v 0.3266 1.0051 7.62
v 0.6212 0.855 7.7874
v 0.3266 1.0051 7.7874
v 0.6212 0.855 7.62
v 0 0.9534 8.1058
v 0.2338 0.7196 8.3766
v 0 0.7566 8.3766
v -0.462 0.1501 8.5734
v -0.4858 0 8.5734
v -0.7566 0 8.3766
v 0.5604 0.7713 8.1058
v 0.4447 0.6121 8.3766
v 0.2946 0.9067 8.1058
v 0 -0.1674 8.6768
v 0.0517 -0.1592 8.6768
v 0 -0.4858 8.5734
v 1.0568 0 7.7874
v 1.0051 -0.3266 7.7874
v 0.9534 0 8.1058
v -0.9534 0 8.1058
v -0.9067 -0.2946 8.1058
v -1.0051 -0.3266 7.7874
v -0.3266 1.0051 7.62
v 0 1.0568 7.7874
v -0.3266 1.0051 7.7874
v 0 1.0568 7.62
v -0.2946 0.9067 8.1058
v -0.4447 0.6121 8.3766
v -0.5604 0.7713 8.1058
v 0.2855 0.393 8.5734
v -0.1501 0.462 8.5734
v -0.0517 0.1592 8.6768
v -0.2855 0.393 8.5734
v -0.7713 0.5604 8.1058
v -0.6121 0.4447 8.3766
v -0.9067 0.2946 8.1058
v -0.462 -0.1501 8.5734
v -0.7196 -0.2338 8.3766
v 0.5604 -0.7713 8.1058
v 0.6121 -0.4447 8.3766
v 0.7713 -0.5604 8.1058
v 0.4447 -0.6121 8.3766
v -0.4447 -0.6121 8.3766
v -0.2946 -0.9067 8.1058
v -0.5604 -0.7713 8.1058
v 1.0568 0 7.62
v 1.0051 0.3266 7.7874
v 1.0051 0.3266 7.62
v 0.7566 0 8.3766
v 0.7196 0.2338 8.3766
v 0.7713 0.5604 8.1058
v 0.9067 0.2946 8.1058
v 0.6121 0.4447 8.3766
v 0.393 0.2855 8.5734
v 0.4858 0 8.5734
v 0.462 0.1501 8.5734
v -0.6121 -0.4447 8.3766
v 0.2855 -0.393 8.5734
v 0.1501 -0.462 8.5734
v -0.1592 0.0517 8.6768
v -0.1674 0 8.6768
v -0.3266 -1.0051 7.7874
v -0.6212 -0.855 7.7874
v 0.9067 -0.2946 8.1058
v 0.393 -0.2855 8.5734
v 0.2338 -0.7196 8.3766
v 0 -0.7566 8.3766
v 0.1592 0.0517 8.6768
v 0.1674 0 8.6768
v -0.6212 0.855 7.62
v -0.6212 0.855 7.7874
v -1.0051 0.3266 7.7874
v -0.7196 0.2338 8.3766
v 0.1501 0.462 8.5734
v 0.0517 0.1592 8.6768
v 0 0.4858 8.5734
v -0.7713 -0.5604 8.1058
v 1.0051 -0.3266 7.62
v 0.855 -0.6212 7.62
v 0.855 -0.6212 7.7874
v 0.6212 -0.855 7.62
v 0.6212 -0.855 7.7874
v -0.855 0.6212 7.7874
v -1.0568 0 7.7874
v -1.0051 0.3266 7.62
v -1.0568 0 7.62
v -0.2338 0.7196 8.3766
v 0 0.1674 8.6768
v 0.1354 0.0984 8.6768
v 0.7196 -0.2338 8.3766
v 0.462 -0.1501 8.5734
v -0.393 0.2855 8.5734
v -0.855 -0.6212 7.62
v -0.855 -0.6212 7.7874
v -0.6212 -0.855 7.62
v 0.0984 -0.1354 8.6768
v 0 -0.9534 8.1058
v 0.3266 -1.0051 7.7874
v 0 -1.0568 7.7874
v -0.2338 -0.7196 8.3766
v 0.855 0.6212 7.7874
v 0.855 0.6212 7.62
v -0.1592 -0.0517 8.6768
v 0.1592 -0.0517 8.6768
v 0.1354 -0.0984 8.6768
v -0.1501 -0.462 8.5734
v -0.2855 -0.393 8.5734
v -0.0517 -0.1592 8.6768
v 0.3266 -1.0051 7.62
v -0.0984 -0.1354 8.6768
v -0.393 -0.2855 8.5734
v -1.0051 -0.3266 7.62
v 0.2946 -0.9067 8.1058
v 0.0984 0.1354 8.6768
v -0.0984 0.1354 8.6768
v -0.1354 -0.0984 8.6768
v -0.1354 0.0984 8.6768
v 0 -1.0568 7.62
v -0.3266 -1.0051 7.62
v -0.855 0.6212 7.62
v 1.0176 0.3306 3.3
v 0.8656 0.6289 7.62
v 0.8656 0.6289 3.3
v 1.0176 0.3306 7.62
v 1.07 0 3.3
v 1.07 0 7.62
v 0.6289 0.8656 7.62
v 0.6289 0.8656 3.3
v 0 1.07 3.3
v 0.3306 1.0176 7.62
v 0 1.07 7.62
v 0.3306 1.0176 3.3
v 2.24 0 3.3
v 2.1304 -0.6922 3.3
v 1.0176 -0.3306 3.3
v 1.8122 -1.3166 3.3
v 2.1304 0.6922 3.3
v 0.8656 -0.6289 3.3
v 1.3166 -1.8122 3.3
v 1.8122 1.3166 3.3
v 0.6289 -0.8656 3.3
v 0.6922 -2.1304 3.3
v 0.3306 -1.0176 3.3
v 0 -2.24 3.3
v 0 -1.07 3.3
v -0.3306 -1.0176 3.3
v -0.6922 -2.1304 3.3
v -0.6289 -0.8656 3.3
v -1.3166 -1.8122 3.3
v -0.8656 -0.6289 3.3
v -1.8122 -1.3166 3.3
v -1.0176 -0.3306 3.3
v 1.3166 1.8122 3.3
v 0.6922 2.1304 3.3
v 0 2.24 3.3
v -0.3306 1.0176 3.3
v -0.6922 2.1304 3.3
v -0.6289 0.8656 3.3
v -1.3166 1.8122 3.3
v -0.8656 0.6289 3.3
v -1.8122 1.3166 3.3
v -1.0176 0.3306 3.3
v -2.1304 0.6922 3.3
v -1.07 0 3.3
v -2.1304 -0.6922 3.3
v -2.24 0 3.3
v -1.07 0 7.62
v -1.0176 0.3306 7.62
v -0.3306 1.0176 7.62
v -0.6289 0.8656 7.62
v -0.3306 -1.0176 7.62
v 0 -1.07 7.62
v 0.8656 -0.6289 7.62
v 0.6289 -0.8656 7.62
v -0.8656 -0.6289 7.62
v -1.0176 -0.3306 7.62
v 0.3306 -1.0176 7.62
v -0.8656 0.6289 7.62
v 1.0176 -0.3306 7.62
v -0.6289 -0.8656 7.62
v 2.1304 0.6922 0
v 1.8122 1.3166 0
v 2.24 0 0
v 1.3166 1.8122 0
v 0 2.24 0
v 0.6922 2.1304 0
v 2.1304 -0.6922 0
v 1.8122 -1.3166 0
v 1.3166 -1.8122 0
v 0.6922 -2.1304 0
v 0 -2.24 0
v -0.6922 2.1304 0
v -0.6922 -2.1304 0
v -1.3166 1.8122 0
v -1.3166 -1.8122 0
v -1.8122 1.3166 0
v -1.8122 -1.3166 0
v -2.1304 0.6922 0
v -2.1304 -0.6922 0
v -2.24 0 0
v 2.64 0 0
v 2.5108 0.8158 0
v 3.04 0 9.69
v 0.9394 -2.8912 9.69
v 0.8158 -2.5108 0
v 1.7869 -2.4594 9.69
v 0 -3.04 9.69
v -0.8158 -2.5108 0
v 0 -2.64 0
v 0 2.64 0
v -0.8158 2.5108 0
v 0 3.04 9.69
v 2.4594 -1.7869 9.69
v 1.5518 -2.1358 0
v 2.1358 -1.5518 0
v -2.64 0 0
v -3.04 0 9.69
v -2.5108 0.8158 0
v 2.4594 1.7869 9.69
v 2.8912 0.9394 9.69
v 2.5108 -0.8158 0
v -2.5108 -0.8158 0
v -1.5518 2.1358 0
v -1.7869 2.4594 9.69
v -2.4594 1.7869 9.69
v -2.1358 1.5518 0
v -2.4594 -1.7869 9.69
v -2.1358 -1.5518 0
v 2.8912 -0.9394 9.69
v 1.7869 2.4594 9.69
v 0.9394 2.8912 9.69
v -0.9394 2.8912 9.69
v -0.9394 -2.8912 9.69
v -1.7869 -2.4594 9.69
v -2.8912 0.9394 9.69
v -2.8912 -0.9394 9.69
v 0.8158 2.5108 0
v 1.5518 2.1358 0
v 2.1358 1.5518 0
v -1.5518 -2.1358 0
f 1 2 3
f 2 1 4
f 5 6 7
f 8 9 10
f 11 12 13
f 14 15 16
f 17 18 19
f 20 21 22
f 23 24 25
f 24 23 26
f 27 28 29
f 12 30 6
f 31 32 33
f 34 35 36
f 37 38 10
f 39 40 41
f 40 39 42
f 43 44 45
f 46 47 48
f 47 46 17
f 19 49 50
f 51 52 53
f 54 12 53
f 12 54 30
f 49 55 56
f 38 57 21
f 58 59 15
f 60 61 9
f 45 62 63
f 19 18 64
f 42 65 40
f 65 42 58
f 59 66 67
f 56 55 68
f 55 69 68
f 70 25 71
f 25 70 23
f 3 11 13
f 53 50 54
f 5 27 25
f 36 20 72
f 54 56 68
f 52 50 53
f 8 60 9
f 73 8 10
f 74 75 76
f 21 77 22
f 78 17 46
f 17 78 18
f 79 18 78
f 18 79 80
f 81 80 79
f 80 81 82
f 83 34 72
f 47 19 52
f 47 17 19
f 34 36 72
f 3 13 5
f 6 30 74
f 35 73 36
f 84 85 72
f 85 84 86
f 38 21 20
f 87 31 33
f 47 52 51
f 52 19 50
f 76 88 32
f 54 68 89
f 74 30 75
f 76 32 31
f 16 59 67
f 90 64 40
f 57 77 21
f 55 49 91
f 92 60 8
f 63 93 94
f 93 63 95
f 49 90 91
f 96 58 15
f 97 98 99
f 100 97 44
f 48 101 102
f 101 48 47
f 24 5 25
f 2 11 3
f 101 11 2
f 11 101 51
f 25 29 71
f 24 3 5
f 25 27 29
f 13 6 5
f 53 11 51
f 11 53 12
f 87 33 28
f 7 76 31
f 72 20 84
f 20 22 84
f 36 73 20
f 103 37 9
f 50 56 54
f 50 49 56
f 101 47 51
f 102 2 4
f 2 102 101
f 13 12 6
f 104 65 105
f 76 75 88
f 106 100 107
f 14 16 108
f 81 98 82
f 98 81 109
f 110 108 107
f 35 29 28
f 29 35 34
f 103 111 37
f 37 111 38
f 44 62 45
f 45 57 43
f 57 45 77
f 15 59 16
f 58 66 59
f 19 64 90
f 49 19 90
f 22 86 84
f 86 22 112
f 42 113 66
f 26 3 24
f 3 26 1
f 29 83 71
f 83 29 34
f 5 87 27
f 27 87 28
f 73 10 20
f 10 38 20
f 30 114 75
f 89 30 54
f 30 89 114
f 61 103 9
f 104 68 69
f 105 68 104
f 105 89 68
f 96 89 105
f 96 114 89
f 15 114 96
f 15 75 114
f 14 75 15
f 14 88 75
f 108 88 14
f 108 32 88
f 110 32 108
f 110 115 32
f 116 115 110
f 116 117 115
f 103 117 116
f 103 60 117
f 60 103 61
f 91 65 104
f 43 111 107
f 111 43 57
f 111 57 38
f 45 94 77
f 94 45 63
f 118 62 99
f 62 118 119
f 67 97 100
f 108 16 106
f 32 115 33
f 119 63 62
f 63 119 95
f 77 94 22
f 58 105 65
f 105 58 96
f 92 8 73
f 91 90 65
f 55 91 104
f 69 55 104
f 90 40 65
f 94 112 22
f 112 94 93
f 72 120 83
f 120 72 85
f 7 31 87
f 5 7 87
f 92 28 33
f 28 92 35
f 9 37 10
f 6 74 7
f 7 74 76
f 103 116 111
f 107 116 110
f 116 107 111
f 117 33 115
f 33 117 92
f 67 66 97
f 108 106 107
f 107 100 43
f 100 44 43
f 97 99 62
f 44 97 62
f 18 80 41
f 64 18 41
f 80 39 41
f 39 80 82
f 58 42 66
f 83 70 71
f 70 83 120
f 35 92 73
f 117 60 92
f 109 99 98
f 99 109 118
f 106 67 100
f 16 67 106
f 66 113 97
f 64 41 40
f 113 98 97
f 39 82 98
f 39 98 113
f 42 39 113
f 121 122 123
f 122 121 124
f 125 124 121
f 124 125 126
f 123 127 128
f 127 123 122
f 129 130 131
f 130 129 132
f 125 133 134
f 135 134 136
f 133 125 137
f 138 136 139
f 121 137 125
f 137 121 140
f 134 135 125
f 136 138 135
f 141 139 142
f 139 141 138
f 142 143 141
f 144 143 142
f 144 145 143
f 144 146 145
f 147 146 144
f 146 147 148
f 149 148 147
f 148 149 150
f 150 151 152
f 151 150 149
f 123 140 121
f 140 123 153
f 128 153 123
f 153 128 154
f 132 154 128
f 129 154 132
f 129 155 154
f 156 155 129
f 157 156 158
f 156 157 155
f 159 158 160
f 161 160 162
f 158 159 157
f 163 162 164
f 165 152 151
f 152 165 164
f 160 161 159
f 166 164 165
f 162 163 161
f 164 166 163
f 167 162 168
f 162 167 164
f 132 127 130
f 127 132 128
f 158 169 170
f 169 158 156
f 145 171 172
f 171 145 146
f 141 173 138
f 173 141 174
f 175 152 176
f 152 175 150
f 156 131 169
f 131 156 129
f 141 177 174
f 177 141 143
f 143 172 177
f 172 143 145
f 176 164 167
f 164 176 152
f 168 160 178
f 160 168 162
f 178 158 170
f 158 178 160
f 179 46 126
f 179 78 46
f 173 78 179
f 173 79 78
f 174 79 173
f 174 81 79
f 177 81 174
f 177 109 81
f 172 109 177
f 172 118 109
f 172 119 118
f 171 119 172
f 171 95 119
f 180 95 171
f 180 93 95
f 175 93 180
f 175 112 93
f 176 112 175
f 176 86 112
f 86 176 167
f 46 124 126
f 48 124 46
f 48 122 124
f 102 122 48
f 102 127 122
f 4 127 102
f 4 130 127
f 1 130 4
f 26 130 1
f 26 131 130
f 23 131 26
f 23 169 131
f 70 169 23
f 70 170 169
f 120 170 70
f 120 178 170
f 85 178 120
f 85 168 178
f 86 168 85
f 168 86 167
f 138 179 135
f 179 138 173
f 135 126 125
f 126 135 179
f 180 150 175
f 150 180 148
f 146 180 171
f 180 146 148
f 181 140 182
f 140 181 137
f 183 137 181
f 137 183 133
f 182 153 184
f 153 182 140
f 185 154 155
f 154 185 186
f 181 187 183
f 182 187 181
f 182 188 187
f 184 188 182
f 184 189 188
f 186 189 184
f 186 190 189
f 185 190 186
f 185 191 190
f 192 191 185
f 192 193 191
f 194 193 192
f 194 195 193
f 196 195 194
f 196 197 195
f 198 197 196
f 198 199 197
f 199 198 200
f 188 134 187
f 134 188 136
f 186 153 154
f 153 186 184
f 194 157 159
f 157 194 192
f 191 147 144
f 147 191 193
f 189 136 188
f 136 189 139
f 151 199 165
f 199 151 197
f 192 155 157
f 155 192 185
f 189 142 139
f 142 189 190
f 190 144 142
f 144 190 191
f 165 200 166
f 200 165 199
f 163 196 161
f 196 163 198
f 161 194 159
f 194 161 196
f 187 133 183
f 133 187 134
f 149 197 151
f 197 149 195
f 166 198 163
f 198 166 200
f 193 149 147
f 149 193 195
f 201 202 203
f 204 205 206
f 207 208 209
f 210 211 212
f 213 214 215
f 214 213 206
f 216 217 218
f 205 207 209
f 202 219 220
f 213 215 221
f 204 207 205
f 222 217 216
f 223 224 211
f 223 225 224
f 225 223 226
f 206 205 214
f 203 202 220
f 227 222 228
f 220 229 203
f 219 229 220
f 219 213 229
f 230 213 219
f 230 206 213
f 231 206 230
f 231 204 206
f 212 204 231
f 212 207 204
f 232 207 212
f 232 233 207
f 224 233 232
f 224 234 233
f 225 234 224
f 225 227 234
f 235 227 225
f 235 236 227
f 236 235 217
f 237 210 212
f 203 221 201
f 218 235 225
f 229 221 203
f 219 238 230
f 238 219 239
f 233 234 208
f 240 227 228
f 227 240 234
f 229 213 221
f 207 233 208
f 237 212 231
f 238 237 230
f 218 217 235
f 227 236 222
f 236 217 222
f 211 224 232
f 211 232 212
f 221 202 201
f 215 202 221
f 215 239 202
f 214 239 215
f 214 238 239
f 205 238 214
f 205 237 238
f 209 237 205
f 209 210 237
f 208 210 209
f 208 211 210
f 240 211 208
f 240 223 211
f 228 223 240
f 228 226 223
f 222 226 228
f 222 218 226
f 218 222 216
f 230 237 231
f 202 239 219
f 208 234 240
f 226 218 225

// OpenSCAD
/* 
	2.14 little dia
	4.48 big dia
	4.32 ht
*/
littleRad = 2.14/2;
littleHt  = 4.32;
bigRad    = 4.48/2;
bigHt     = 3.3; // was 4 originally

$fn=20;

difference() {
	cylinder(r1=bigRad+0.4,r2=bigRad+0.8,h=littleRad+littleHt + bigHt + 1);
	internals();
}

module internals() {
	translate([0,0,bigHt]) {
		translate([0,0,littleHt]) sphere(r=littleRad);
		cylinder(r=littleRad, h=littleHt);
		translate([0,0,-1*bigHt]) cylinder(r=bigRad, h = bigHt);
	}
}
